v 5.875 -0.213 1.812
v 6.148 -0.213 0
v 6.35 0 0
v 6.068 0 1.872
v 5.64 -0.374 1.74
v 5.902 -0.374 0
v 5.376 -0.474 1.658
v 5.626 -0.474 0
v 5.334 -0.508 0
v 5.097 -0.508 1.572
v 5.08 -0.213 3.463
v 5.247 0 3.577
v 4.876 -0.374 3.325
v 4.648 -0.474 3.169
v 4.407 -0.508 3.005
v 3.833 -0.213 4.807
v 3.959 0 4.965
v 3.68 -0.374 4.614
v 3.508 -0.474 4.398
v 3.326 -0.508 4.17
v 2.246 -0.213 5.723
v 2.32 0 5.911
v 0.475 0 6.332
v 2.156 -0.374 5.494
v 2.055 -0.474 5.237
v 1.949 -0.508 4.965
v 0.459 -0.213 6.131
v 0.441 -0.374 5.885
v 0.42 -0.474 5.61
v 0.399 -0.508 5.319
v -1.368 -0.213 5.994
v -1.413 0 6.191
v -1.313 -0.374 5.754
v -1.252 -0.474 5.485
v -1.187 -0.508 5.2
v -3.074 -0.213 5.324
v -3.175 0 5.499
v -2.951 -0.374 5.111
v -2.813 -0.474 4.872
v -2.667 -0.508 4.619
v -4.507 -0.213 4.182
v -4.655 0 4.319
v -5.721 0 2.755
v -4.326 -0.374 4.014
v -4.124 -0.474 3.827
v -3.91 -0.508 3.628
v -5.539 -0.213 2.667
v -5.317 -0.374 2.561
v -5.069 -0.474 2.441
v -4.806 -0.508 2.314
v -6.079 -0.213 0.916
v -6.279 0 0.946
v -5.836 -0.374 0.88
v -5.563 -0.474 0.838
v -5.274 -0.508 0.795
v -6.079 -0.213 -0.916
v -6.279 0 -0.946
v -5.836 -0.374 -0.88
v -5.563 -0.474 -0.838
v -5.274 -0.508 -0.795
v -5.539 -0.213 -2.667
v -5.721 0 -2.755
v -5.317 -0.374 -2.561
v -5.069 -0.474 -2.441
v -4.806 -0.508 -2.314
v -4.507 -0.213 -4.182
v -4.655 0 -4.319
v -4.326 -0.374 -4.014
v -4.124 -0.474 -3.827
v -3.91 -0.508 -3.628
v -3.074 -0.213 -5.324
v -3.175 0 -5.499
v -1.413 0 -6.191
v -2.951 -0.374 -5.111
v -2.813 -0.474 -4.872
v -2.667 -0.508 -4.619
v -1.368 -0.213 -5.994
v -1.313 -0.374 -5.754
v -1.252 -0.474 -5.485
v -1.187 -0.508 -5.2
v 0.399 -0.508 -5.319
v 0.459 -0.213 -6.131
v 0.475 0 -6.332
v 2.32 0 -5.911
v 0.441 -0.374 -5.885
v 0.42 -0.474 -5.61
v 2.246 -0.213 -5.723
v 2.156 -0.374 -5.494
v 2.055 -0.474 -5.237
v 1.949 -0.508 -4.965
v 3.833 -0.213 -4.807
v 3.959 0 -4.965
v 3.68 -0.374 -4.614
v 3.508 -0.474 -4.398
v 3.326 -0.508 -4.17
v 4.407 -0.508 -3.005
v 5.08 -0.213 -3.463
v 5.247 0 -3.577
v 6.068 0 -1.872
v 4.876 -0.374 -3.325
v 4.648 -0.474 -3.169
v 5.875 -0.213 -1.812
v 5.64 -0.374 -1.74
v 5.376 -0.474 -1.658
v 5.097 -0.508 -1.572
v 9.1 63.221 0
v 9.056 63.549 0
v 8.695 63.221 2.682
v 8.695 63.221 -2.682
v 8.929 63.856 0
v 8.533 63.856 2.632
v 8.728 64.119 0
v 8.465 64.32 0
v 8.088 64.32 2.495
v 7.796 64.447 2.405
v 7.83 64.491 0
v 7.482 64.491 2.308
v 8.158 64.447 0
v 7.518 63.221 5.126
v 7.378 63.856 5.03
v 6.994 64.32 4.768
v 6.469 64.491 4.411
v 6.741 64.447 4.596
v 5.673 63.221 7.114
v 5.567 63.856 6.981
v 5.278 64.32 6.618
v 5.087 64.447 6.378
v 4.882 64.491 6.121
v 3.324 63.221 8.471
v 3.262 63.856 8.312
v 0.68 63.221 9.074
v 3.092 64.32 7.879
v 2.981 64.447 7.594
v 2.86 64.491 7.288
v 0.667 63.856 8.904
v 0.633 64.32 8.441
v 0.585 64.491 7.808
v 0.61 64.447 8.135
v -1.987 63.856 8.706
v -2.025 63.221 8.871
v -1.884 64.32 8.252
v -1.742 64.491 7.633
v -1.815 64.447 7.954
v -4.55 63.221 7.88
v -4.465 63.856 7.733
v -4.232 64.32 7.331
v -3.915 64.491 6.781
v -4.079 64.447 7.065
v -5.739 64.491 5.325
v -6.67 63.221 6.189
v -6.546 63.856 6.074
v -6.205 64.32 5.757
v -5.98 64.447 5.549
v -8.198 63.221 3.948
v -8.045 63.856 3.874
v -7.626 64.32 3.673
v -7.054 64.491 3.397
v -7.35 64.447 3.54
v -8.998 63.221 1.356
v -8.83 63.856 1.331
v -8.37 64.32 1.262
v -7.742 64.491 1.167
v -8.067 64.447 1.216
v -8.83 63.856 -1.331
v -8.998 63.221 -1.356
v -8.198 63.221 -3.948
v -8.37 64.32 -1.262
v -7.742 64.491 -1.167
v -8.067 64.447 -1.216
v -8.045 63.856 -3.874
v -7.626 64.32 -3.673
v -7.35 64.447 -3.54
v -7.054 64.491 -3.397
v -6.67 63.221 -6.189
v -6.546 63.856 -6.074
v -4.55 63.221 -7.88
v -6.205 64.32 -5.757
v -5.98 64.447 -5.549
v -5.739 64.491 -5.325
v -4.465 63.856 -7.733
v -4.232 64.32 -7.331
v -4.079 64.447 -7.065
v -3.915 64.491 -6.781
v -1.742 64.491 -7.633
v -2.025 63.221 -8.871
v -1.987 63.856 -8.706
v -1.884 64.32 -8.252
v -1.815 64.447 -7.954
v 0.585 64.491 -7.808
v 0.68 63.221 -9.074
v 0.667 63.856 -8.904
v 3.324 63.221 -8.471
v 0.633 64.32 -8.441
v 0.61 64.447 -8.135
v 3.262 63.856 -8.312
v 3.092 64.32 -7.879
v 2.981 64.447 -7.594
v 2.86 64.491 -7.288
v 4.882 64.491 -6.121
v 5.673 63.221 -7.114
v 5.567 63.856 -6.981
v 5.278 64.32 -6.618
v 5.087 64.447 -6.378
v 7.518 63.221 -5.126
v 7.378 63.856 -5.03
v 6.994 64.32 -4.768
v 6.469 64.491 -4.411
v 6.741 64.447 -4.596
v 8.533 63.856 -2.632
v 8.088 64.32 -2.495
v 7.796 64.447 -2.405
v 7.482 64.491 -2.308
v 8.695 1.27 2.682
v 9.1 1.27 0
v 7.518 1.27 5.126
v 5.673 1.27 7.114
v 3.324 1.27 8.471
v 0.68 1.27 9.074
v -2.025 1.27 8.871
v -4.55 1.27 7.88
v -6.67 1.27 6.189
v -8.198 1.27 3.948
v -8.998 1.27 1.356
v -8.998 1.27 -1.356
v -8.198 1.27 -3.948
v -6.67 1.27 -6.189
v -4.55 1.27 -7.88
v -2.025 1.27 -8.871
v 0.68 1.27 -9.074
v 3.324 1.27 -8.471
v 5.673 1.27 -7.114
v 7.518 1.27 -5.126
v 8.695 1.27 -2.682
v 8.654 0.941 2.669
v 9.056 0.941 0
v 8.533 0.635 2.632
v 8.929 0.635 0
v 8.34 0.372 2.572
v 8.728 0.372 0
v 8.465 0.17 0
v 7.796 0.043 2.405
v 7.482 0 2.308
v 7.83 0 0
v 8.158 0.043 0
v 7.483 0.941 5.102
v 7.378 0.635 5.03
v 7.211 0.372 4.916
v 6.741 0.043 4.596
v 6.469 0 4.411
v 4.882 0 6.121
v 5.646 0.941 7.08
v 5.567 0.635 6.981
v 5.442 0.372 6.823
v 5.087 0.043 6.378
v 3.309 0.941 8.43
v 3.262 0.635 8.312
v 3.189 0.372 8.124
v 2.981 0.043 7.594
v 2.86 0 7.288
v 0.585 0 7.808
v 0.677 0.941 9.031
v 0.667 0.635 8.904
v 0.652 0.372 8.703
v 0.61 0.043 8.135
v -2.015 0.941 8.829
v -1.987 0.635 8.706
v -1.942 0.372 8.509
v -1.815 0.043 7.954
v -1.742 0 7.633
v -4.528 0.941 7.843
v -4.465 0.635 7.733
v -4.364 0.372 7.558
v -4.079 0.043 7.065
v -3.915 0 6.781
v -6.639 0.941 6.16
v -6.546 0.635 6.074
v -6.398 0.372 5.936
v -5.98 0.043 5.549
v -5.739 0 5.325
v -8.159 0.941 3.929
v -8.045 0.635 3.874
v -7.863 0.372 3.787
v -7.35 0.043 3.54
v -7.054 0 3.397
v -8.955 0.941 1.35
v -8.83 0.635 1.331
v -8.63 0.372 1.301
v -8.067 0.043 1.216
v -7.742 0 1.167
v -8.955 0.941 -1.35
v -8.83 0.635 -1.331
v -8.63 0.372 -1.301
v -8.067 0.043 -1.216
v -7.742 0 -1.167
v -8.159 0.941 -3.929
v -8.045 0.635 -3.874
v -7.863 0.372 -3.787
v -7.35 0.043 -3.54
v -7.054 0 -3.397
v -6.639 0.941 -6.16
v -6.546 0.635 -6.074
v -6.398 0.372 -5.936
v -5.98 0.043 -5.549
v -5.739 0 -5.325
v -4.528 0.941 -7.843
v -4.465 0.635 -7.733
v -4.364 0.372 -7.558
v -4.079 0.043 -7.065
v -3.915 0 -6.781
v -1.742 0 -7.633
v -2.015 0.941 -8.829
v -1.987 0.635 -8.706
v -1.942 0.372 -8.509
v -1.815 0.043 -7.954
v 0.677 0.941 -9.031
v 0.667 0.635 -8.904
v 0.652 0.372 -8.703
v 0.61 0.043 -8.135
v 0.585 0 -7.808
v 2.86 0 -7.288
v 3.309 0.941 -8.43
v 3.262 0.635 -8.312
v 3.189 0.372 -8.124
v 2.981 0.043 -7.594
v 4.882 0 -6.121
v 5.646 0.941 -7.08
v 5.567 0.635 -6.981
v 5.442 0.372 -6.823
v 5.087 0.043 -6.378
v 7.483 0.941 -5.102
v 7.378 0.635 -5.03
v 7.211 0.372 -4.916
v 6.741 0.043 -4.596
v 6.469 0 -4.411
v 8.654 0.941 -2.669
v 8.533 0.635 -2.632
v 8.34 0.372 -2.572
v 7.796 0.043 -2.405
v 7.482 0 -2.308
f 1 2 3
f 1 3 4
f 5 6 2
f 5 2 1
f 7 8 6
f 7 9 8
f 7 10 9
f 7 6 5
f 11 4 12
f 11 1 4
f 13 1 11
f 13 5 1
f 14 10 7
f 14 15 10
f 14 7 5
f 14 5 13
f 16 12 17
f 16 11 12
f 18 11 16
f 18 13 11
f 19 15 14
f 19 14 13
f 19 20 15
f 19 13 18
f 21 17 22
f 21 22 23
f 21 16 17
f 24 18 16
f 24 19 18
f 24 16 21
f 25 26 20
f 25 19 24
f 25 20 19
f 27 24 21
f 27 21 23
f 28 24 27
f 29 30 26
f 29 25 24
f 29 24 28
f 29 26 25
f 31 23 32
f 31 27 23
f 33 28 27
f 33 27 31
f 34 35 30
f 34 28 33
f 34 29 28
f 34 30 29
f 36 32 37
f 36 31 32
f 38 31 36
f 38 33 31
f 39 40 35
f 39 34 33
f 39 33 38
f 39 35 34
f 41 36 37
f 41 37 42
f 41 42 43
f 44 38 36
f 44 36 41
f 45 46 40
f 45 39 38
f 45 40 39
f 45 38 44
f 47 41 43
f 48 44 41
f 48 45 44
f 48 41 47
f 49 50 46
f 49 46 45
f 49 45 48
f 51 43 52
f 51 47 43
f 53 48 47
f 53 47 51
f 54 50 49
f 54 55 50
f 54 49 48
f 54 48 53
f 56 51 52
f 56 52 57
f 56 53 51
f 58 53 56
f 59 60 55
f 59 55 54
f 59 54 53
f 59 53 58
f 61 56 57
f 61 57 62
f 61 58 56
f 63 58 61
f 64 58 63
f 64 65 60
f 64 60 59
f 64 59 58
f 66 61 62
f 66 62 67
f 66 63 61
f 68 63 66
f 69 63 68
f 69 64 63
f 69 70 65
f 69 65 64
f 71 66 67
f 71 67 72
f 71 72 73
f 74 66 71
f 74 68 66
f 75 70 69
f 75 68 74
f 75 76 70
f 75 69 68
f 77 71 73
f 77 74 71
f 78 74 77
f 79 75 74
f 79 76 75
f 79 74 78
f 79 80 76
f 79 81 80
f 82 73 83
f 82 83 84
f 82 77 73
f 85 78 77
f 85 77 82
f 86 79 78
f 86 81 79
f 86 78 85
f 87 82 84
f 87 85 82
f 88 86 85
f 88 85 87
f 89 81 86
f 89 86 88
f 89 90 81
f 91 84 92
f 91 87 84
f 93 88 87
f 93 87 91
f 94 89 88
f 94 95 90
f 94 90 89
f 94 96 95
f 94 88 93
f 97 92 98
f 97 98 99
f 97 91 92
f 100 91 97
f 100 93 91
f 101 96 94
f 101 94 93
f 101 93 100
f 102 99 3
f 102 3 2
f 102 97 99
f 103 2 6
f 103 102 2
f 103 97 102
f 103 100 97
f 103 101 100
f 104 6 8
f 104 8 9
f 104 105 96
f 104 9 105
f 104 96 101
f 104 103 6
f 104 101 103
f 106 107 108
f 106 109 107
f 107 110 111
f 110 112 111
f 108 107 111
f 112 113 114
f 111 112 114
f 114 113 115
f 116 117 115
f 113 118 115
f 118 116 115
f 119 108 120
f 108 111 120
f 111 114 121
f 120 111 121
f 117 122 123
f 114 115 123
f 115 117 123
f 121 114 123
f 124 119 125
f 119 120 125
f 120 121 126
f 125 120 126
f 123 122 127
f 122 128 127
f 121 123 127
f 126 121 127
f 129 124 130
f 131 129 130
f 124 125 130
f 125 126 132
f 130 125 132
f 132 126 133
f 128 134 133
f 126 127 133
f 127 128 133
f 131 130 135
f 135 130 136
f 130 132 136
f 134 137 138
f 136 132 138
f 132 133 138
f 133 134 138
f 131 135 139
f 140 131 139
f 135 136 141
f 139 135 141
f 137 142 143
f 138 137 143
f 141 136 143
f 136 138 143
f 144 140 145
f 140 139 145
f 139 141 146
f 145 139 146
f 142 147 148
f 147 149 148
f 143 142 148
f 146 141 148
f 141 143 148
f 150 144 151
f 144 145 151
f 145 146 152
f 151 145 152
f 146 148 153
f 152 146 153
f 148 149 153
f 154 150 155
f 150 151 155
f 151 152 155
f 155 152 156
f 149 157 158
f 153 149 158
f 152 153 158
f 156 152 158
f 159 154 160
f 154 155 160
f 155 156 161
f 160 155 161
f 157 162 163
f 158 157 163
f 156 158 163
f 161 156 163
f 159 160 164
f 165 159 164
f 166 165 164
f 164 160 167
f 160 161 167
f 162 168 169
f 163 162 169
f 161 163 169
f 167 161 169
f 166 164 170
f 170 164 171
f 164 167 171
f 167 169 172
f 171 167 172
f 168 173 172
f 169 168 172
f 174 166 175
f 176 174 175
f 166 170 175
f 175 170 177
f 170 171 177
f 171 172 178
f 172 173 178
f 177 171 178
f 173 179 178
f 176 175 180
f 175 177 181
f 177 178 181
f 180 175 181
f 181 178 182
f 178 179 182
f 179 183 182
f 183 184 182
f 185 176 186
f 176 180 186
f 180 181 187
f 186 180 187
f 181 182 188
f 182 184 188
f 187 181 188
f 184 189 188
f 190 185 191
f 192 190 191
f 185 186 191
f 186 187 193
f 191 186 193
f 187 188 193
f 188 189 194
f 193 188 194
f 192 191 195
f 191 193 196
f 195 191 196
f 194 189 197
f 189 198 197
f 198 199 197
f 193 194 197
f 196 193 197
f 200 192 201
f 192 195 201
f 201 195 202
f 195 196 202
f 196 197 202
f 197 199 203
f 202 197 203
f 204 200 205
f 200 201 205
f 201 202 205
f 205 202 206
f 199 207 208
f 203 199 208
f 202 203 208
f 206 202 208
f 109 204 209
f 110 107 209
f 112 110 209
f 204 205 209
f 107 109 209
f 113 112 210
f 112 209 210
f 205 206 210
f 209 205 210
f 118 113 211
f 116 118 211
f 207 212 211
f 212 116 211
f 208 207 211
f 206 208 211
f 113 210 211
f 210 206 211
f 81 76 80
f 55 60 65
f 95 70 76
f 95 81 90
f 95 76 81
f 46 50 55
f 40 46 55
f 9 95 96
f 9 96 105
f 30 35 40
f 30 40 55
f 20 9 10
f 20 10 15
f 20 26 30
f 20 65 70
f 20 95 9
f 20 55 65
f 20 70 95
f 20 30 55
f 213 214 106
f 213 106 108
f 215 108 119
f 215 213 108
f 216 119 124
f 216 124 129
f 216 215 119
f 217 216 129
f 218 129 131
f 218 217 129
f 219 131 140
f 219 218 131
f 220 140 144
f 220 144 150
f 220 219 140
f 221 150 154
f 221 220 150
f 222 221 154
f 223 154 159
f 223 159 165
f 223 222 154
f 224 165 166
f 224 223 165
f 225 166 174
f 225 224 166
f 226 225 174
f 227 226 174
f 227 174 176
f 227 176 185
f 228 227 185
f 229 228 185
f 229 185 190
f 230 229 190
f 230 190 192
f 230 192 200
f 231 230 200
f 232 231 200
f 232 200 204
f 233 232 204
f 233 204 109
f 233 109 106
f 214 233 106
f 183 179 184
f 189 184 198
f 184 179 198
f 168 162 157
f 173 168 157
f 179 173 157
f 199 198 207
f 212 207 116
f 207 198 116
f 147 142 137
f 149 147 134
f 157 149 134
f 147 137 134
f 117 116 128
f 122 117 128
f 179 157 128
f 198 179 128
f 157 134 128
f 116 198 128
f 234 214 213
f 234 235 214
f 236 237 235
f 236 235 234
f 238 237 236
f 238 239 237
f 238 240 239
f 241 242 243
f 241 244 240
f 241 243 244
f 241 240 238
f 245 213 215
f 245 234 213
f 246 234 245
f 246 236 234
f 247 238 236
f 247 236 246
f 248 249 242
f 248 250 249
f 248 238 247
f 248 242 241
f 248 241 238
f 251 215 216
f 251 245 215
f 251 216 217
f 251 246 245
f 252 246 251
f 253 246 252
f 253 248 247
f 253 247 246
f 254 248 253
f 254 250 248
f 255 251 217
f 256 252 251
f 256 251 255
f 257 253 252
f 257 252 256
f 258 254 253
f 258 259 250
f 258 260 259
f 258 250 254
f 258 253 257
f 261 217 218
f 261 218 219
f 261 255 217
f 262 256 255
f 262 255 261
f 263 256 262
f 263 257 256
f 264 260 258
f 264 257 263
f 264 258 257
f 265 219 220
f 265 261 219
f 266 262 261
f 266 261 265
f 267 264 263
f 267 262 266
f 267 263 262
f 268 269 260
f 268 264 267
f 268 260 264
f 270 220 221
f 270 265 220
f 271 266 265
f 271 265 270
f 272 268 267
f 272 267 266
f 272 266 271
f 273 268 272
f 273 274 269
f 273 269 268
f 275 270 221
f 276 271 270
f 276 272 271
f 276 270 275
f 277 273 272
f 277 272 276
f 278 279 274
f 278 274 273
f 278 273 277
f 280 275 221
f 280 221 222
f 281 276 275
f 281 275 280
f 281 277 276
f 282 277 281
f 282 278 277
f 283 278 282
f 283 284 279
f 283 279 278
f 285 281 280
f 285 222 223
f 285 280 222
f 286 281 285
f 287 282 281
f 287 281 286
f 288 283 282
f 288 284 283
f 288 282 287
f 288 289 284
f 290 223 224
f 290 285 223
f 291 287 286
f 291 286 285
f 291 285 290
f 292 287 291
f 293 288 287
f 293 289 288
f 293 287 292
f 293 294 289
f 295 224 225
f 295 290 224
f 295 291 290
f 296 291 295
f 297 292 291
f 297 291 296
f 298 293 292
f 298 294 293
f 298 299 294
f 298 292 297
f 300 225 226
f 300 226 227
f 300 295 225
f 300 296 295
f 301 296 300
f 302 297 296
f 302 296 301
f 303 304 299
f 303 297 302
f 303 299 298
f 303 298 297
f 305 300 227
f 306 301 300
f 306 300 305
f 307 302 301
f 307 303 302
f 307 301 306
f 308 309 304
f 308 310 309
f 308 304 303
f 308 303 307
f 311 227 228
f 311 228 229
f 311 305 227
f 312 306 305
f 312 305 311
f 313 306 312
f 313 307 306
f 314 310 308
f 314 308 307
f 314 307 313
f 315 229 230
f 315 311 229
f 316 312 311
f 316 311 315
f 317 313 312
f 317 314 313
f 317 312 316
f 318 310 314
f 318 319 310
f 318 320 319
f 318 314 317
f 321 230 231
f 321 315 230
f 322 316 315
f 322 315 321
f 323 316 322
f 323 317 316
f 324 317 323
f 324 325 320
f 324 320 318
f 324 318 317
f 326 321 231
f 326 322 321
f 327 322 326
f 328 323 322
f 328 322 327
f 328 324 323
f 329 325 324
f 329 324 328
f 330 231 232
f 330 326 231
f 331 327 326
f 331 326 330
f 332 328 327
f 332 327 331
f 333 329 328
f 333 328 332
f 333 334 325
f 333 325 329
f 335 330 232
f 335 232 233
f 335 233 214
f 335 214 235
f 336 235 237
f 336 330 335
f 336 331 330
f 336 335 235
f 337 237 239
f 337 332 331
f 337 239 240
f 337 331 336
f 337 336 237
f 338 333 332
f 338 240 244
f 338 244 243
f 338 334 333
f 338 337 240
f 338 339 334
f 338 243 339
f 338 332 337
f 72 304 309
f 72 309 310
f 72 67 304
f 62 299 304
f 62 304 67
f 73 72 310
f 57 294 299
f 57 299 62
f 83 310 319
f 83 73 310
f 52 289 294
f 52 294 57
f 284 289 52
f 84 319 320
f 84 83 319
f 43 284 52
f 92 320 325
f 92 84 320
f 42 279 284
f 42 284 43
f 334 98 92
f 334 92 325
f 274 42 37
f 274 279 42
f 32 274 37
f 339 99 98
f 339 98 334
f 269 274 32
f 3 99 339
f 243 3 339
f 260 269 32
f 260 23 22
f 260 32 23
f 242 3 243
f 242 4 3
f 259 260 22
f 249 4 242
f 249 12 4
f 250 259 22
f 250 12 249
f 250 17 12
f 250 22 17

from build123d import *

# Parameters (mm, degrees)
F0_R     = 9.09955
F1_DEPTH = 64.4906
F2_R     = 6.35
F3_DEPTH = 0.508


# Not quite as in the source:
# - a fillet or chamfer that OpenCascade refuses, or shapes differently, is made with other operations: its cross-section is extruded or revolved along the edge and cut away or added


with BuildPart() as f1:
    # F0 (on Front) → F1 (new body)
    with BuildSketch(Plane.XZ):
        Circle(F0_R)
    extrude(amount=-F1_DEPTH)

    # F2 (on face) → F3 (join)
    with BuildSketch(Plane.XZ):
        Circle(F2_R)
    extrude(amount=F3_DEPTH)

    # F4: fillet of radius 1.27 on 3 edges, made by hand

    # F4_s1 → F4_t2 (revolve, cut)
    with BuildSketch(Plane.XY):
        with BuildLine():
            ThreePointArc((9.09955, 63.2206), (8.7275756121, 64.1186256121), (7.82955, 64.4906))
            Line((7.82955, 64.4906), (9.09955, 64.4906))
            Line((9.09955, 64.4906), (9.09955, 63.2206))
        make_face()
    revolve(axis=Axis((0, 64.4906, 0), (0, -1, 0)), mode=Mode.SUBTRACT)

    # F4_s3 → F4_t4 (revolve, cut)
    with BuildSketch(Plane.XY):
        with BuildLine():
            ThreePointArc((9.09955, 1.27), (8.7275756121, 0.3719743879), (7.82955, 0))
            Line((7.82955, 0), (9.09955, 0))
            Line((9.09955, 0), (9.09955, 1.27))
        make_face()
    revolve(axis=Axis((0, 0, 0), (0, -1, 0)), mode=Mode.SUBTRACT)

    # F4_s5 → F4_t6 (revolve, cut)
    with BuildSketch(Plane.XY):
        with BuildLine():
            ThreePointArc((6.35, 0), (5.9019612663, -0.3739225326), (5.334, -0.508))
            Line((5.334, -0.508), (6.35, -0.508))
            Line((6.35, -0.508), (6.35, 0))
        make_face()
    revolve(axis=Axis((0, -0.508, 0), (0, -1, 0)), mode=Mode.SUBTRACT)


solid = f1.part
